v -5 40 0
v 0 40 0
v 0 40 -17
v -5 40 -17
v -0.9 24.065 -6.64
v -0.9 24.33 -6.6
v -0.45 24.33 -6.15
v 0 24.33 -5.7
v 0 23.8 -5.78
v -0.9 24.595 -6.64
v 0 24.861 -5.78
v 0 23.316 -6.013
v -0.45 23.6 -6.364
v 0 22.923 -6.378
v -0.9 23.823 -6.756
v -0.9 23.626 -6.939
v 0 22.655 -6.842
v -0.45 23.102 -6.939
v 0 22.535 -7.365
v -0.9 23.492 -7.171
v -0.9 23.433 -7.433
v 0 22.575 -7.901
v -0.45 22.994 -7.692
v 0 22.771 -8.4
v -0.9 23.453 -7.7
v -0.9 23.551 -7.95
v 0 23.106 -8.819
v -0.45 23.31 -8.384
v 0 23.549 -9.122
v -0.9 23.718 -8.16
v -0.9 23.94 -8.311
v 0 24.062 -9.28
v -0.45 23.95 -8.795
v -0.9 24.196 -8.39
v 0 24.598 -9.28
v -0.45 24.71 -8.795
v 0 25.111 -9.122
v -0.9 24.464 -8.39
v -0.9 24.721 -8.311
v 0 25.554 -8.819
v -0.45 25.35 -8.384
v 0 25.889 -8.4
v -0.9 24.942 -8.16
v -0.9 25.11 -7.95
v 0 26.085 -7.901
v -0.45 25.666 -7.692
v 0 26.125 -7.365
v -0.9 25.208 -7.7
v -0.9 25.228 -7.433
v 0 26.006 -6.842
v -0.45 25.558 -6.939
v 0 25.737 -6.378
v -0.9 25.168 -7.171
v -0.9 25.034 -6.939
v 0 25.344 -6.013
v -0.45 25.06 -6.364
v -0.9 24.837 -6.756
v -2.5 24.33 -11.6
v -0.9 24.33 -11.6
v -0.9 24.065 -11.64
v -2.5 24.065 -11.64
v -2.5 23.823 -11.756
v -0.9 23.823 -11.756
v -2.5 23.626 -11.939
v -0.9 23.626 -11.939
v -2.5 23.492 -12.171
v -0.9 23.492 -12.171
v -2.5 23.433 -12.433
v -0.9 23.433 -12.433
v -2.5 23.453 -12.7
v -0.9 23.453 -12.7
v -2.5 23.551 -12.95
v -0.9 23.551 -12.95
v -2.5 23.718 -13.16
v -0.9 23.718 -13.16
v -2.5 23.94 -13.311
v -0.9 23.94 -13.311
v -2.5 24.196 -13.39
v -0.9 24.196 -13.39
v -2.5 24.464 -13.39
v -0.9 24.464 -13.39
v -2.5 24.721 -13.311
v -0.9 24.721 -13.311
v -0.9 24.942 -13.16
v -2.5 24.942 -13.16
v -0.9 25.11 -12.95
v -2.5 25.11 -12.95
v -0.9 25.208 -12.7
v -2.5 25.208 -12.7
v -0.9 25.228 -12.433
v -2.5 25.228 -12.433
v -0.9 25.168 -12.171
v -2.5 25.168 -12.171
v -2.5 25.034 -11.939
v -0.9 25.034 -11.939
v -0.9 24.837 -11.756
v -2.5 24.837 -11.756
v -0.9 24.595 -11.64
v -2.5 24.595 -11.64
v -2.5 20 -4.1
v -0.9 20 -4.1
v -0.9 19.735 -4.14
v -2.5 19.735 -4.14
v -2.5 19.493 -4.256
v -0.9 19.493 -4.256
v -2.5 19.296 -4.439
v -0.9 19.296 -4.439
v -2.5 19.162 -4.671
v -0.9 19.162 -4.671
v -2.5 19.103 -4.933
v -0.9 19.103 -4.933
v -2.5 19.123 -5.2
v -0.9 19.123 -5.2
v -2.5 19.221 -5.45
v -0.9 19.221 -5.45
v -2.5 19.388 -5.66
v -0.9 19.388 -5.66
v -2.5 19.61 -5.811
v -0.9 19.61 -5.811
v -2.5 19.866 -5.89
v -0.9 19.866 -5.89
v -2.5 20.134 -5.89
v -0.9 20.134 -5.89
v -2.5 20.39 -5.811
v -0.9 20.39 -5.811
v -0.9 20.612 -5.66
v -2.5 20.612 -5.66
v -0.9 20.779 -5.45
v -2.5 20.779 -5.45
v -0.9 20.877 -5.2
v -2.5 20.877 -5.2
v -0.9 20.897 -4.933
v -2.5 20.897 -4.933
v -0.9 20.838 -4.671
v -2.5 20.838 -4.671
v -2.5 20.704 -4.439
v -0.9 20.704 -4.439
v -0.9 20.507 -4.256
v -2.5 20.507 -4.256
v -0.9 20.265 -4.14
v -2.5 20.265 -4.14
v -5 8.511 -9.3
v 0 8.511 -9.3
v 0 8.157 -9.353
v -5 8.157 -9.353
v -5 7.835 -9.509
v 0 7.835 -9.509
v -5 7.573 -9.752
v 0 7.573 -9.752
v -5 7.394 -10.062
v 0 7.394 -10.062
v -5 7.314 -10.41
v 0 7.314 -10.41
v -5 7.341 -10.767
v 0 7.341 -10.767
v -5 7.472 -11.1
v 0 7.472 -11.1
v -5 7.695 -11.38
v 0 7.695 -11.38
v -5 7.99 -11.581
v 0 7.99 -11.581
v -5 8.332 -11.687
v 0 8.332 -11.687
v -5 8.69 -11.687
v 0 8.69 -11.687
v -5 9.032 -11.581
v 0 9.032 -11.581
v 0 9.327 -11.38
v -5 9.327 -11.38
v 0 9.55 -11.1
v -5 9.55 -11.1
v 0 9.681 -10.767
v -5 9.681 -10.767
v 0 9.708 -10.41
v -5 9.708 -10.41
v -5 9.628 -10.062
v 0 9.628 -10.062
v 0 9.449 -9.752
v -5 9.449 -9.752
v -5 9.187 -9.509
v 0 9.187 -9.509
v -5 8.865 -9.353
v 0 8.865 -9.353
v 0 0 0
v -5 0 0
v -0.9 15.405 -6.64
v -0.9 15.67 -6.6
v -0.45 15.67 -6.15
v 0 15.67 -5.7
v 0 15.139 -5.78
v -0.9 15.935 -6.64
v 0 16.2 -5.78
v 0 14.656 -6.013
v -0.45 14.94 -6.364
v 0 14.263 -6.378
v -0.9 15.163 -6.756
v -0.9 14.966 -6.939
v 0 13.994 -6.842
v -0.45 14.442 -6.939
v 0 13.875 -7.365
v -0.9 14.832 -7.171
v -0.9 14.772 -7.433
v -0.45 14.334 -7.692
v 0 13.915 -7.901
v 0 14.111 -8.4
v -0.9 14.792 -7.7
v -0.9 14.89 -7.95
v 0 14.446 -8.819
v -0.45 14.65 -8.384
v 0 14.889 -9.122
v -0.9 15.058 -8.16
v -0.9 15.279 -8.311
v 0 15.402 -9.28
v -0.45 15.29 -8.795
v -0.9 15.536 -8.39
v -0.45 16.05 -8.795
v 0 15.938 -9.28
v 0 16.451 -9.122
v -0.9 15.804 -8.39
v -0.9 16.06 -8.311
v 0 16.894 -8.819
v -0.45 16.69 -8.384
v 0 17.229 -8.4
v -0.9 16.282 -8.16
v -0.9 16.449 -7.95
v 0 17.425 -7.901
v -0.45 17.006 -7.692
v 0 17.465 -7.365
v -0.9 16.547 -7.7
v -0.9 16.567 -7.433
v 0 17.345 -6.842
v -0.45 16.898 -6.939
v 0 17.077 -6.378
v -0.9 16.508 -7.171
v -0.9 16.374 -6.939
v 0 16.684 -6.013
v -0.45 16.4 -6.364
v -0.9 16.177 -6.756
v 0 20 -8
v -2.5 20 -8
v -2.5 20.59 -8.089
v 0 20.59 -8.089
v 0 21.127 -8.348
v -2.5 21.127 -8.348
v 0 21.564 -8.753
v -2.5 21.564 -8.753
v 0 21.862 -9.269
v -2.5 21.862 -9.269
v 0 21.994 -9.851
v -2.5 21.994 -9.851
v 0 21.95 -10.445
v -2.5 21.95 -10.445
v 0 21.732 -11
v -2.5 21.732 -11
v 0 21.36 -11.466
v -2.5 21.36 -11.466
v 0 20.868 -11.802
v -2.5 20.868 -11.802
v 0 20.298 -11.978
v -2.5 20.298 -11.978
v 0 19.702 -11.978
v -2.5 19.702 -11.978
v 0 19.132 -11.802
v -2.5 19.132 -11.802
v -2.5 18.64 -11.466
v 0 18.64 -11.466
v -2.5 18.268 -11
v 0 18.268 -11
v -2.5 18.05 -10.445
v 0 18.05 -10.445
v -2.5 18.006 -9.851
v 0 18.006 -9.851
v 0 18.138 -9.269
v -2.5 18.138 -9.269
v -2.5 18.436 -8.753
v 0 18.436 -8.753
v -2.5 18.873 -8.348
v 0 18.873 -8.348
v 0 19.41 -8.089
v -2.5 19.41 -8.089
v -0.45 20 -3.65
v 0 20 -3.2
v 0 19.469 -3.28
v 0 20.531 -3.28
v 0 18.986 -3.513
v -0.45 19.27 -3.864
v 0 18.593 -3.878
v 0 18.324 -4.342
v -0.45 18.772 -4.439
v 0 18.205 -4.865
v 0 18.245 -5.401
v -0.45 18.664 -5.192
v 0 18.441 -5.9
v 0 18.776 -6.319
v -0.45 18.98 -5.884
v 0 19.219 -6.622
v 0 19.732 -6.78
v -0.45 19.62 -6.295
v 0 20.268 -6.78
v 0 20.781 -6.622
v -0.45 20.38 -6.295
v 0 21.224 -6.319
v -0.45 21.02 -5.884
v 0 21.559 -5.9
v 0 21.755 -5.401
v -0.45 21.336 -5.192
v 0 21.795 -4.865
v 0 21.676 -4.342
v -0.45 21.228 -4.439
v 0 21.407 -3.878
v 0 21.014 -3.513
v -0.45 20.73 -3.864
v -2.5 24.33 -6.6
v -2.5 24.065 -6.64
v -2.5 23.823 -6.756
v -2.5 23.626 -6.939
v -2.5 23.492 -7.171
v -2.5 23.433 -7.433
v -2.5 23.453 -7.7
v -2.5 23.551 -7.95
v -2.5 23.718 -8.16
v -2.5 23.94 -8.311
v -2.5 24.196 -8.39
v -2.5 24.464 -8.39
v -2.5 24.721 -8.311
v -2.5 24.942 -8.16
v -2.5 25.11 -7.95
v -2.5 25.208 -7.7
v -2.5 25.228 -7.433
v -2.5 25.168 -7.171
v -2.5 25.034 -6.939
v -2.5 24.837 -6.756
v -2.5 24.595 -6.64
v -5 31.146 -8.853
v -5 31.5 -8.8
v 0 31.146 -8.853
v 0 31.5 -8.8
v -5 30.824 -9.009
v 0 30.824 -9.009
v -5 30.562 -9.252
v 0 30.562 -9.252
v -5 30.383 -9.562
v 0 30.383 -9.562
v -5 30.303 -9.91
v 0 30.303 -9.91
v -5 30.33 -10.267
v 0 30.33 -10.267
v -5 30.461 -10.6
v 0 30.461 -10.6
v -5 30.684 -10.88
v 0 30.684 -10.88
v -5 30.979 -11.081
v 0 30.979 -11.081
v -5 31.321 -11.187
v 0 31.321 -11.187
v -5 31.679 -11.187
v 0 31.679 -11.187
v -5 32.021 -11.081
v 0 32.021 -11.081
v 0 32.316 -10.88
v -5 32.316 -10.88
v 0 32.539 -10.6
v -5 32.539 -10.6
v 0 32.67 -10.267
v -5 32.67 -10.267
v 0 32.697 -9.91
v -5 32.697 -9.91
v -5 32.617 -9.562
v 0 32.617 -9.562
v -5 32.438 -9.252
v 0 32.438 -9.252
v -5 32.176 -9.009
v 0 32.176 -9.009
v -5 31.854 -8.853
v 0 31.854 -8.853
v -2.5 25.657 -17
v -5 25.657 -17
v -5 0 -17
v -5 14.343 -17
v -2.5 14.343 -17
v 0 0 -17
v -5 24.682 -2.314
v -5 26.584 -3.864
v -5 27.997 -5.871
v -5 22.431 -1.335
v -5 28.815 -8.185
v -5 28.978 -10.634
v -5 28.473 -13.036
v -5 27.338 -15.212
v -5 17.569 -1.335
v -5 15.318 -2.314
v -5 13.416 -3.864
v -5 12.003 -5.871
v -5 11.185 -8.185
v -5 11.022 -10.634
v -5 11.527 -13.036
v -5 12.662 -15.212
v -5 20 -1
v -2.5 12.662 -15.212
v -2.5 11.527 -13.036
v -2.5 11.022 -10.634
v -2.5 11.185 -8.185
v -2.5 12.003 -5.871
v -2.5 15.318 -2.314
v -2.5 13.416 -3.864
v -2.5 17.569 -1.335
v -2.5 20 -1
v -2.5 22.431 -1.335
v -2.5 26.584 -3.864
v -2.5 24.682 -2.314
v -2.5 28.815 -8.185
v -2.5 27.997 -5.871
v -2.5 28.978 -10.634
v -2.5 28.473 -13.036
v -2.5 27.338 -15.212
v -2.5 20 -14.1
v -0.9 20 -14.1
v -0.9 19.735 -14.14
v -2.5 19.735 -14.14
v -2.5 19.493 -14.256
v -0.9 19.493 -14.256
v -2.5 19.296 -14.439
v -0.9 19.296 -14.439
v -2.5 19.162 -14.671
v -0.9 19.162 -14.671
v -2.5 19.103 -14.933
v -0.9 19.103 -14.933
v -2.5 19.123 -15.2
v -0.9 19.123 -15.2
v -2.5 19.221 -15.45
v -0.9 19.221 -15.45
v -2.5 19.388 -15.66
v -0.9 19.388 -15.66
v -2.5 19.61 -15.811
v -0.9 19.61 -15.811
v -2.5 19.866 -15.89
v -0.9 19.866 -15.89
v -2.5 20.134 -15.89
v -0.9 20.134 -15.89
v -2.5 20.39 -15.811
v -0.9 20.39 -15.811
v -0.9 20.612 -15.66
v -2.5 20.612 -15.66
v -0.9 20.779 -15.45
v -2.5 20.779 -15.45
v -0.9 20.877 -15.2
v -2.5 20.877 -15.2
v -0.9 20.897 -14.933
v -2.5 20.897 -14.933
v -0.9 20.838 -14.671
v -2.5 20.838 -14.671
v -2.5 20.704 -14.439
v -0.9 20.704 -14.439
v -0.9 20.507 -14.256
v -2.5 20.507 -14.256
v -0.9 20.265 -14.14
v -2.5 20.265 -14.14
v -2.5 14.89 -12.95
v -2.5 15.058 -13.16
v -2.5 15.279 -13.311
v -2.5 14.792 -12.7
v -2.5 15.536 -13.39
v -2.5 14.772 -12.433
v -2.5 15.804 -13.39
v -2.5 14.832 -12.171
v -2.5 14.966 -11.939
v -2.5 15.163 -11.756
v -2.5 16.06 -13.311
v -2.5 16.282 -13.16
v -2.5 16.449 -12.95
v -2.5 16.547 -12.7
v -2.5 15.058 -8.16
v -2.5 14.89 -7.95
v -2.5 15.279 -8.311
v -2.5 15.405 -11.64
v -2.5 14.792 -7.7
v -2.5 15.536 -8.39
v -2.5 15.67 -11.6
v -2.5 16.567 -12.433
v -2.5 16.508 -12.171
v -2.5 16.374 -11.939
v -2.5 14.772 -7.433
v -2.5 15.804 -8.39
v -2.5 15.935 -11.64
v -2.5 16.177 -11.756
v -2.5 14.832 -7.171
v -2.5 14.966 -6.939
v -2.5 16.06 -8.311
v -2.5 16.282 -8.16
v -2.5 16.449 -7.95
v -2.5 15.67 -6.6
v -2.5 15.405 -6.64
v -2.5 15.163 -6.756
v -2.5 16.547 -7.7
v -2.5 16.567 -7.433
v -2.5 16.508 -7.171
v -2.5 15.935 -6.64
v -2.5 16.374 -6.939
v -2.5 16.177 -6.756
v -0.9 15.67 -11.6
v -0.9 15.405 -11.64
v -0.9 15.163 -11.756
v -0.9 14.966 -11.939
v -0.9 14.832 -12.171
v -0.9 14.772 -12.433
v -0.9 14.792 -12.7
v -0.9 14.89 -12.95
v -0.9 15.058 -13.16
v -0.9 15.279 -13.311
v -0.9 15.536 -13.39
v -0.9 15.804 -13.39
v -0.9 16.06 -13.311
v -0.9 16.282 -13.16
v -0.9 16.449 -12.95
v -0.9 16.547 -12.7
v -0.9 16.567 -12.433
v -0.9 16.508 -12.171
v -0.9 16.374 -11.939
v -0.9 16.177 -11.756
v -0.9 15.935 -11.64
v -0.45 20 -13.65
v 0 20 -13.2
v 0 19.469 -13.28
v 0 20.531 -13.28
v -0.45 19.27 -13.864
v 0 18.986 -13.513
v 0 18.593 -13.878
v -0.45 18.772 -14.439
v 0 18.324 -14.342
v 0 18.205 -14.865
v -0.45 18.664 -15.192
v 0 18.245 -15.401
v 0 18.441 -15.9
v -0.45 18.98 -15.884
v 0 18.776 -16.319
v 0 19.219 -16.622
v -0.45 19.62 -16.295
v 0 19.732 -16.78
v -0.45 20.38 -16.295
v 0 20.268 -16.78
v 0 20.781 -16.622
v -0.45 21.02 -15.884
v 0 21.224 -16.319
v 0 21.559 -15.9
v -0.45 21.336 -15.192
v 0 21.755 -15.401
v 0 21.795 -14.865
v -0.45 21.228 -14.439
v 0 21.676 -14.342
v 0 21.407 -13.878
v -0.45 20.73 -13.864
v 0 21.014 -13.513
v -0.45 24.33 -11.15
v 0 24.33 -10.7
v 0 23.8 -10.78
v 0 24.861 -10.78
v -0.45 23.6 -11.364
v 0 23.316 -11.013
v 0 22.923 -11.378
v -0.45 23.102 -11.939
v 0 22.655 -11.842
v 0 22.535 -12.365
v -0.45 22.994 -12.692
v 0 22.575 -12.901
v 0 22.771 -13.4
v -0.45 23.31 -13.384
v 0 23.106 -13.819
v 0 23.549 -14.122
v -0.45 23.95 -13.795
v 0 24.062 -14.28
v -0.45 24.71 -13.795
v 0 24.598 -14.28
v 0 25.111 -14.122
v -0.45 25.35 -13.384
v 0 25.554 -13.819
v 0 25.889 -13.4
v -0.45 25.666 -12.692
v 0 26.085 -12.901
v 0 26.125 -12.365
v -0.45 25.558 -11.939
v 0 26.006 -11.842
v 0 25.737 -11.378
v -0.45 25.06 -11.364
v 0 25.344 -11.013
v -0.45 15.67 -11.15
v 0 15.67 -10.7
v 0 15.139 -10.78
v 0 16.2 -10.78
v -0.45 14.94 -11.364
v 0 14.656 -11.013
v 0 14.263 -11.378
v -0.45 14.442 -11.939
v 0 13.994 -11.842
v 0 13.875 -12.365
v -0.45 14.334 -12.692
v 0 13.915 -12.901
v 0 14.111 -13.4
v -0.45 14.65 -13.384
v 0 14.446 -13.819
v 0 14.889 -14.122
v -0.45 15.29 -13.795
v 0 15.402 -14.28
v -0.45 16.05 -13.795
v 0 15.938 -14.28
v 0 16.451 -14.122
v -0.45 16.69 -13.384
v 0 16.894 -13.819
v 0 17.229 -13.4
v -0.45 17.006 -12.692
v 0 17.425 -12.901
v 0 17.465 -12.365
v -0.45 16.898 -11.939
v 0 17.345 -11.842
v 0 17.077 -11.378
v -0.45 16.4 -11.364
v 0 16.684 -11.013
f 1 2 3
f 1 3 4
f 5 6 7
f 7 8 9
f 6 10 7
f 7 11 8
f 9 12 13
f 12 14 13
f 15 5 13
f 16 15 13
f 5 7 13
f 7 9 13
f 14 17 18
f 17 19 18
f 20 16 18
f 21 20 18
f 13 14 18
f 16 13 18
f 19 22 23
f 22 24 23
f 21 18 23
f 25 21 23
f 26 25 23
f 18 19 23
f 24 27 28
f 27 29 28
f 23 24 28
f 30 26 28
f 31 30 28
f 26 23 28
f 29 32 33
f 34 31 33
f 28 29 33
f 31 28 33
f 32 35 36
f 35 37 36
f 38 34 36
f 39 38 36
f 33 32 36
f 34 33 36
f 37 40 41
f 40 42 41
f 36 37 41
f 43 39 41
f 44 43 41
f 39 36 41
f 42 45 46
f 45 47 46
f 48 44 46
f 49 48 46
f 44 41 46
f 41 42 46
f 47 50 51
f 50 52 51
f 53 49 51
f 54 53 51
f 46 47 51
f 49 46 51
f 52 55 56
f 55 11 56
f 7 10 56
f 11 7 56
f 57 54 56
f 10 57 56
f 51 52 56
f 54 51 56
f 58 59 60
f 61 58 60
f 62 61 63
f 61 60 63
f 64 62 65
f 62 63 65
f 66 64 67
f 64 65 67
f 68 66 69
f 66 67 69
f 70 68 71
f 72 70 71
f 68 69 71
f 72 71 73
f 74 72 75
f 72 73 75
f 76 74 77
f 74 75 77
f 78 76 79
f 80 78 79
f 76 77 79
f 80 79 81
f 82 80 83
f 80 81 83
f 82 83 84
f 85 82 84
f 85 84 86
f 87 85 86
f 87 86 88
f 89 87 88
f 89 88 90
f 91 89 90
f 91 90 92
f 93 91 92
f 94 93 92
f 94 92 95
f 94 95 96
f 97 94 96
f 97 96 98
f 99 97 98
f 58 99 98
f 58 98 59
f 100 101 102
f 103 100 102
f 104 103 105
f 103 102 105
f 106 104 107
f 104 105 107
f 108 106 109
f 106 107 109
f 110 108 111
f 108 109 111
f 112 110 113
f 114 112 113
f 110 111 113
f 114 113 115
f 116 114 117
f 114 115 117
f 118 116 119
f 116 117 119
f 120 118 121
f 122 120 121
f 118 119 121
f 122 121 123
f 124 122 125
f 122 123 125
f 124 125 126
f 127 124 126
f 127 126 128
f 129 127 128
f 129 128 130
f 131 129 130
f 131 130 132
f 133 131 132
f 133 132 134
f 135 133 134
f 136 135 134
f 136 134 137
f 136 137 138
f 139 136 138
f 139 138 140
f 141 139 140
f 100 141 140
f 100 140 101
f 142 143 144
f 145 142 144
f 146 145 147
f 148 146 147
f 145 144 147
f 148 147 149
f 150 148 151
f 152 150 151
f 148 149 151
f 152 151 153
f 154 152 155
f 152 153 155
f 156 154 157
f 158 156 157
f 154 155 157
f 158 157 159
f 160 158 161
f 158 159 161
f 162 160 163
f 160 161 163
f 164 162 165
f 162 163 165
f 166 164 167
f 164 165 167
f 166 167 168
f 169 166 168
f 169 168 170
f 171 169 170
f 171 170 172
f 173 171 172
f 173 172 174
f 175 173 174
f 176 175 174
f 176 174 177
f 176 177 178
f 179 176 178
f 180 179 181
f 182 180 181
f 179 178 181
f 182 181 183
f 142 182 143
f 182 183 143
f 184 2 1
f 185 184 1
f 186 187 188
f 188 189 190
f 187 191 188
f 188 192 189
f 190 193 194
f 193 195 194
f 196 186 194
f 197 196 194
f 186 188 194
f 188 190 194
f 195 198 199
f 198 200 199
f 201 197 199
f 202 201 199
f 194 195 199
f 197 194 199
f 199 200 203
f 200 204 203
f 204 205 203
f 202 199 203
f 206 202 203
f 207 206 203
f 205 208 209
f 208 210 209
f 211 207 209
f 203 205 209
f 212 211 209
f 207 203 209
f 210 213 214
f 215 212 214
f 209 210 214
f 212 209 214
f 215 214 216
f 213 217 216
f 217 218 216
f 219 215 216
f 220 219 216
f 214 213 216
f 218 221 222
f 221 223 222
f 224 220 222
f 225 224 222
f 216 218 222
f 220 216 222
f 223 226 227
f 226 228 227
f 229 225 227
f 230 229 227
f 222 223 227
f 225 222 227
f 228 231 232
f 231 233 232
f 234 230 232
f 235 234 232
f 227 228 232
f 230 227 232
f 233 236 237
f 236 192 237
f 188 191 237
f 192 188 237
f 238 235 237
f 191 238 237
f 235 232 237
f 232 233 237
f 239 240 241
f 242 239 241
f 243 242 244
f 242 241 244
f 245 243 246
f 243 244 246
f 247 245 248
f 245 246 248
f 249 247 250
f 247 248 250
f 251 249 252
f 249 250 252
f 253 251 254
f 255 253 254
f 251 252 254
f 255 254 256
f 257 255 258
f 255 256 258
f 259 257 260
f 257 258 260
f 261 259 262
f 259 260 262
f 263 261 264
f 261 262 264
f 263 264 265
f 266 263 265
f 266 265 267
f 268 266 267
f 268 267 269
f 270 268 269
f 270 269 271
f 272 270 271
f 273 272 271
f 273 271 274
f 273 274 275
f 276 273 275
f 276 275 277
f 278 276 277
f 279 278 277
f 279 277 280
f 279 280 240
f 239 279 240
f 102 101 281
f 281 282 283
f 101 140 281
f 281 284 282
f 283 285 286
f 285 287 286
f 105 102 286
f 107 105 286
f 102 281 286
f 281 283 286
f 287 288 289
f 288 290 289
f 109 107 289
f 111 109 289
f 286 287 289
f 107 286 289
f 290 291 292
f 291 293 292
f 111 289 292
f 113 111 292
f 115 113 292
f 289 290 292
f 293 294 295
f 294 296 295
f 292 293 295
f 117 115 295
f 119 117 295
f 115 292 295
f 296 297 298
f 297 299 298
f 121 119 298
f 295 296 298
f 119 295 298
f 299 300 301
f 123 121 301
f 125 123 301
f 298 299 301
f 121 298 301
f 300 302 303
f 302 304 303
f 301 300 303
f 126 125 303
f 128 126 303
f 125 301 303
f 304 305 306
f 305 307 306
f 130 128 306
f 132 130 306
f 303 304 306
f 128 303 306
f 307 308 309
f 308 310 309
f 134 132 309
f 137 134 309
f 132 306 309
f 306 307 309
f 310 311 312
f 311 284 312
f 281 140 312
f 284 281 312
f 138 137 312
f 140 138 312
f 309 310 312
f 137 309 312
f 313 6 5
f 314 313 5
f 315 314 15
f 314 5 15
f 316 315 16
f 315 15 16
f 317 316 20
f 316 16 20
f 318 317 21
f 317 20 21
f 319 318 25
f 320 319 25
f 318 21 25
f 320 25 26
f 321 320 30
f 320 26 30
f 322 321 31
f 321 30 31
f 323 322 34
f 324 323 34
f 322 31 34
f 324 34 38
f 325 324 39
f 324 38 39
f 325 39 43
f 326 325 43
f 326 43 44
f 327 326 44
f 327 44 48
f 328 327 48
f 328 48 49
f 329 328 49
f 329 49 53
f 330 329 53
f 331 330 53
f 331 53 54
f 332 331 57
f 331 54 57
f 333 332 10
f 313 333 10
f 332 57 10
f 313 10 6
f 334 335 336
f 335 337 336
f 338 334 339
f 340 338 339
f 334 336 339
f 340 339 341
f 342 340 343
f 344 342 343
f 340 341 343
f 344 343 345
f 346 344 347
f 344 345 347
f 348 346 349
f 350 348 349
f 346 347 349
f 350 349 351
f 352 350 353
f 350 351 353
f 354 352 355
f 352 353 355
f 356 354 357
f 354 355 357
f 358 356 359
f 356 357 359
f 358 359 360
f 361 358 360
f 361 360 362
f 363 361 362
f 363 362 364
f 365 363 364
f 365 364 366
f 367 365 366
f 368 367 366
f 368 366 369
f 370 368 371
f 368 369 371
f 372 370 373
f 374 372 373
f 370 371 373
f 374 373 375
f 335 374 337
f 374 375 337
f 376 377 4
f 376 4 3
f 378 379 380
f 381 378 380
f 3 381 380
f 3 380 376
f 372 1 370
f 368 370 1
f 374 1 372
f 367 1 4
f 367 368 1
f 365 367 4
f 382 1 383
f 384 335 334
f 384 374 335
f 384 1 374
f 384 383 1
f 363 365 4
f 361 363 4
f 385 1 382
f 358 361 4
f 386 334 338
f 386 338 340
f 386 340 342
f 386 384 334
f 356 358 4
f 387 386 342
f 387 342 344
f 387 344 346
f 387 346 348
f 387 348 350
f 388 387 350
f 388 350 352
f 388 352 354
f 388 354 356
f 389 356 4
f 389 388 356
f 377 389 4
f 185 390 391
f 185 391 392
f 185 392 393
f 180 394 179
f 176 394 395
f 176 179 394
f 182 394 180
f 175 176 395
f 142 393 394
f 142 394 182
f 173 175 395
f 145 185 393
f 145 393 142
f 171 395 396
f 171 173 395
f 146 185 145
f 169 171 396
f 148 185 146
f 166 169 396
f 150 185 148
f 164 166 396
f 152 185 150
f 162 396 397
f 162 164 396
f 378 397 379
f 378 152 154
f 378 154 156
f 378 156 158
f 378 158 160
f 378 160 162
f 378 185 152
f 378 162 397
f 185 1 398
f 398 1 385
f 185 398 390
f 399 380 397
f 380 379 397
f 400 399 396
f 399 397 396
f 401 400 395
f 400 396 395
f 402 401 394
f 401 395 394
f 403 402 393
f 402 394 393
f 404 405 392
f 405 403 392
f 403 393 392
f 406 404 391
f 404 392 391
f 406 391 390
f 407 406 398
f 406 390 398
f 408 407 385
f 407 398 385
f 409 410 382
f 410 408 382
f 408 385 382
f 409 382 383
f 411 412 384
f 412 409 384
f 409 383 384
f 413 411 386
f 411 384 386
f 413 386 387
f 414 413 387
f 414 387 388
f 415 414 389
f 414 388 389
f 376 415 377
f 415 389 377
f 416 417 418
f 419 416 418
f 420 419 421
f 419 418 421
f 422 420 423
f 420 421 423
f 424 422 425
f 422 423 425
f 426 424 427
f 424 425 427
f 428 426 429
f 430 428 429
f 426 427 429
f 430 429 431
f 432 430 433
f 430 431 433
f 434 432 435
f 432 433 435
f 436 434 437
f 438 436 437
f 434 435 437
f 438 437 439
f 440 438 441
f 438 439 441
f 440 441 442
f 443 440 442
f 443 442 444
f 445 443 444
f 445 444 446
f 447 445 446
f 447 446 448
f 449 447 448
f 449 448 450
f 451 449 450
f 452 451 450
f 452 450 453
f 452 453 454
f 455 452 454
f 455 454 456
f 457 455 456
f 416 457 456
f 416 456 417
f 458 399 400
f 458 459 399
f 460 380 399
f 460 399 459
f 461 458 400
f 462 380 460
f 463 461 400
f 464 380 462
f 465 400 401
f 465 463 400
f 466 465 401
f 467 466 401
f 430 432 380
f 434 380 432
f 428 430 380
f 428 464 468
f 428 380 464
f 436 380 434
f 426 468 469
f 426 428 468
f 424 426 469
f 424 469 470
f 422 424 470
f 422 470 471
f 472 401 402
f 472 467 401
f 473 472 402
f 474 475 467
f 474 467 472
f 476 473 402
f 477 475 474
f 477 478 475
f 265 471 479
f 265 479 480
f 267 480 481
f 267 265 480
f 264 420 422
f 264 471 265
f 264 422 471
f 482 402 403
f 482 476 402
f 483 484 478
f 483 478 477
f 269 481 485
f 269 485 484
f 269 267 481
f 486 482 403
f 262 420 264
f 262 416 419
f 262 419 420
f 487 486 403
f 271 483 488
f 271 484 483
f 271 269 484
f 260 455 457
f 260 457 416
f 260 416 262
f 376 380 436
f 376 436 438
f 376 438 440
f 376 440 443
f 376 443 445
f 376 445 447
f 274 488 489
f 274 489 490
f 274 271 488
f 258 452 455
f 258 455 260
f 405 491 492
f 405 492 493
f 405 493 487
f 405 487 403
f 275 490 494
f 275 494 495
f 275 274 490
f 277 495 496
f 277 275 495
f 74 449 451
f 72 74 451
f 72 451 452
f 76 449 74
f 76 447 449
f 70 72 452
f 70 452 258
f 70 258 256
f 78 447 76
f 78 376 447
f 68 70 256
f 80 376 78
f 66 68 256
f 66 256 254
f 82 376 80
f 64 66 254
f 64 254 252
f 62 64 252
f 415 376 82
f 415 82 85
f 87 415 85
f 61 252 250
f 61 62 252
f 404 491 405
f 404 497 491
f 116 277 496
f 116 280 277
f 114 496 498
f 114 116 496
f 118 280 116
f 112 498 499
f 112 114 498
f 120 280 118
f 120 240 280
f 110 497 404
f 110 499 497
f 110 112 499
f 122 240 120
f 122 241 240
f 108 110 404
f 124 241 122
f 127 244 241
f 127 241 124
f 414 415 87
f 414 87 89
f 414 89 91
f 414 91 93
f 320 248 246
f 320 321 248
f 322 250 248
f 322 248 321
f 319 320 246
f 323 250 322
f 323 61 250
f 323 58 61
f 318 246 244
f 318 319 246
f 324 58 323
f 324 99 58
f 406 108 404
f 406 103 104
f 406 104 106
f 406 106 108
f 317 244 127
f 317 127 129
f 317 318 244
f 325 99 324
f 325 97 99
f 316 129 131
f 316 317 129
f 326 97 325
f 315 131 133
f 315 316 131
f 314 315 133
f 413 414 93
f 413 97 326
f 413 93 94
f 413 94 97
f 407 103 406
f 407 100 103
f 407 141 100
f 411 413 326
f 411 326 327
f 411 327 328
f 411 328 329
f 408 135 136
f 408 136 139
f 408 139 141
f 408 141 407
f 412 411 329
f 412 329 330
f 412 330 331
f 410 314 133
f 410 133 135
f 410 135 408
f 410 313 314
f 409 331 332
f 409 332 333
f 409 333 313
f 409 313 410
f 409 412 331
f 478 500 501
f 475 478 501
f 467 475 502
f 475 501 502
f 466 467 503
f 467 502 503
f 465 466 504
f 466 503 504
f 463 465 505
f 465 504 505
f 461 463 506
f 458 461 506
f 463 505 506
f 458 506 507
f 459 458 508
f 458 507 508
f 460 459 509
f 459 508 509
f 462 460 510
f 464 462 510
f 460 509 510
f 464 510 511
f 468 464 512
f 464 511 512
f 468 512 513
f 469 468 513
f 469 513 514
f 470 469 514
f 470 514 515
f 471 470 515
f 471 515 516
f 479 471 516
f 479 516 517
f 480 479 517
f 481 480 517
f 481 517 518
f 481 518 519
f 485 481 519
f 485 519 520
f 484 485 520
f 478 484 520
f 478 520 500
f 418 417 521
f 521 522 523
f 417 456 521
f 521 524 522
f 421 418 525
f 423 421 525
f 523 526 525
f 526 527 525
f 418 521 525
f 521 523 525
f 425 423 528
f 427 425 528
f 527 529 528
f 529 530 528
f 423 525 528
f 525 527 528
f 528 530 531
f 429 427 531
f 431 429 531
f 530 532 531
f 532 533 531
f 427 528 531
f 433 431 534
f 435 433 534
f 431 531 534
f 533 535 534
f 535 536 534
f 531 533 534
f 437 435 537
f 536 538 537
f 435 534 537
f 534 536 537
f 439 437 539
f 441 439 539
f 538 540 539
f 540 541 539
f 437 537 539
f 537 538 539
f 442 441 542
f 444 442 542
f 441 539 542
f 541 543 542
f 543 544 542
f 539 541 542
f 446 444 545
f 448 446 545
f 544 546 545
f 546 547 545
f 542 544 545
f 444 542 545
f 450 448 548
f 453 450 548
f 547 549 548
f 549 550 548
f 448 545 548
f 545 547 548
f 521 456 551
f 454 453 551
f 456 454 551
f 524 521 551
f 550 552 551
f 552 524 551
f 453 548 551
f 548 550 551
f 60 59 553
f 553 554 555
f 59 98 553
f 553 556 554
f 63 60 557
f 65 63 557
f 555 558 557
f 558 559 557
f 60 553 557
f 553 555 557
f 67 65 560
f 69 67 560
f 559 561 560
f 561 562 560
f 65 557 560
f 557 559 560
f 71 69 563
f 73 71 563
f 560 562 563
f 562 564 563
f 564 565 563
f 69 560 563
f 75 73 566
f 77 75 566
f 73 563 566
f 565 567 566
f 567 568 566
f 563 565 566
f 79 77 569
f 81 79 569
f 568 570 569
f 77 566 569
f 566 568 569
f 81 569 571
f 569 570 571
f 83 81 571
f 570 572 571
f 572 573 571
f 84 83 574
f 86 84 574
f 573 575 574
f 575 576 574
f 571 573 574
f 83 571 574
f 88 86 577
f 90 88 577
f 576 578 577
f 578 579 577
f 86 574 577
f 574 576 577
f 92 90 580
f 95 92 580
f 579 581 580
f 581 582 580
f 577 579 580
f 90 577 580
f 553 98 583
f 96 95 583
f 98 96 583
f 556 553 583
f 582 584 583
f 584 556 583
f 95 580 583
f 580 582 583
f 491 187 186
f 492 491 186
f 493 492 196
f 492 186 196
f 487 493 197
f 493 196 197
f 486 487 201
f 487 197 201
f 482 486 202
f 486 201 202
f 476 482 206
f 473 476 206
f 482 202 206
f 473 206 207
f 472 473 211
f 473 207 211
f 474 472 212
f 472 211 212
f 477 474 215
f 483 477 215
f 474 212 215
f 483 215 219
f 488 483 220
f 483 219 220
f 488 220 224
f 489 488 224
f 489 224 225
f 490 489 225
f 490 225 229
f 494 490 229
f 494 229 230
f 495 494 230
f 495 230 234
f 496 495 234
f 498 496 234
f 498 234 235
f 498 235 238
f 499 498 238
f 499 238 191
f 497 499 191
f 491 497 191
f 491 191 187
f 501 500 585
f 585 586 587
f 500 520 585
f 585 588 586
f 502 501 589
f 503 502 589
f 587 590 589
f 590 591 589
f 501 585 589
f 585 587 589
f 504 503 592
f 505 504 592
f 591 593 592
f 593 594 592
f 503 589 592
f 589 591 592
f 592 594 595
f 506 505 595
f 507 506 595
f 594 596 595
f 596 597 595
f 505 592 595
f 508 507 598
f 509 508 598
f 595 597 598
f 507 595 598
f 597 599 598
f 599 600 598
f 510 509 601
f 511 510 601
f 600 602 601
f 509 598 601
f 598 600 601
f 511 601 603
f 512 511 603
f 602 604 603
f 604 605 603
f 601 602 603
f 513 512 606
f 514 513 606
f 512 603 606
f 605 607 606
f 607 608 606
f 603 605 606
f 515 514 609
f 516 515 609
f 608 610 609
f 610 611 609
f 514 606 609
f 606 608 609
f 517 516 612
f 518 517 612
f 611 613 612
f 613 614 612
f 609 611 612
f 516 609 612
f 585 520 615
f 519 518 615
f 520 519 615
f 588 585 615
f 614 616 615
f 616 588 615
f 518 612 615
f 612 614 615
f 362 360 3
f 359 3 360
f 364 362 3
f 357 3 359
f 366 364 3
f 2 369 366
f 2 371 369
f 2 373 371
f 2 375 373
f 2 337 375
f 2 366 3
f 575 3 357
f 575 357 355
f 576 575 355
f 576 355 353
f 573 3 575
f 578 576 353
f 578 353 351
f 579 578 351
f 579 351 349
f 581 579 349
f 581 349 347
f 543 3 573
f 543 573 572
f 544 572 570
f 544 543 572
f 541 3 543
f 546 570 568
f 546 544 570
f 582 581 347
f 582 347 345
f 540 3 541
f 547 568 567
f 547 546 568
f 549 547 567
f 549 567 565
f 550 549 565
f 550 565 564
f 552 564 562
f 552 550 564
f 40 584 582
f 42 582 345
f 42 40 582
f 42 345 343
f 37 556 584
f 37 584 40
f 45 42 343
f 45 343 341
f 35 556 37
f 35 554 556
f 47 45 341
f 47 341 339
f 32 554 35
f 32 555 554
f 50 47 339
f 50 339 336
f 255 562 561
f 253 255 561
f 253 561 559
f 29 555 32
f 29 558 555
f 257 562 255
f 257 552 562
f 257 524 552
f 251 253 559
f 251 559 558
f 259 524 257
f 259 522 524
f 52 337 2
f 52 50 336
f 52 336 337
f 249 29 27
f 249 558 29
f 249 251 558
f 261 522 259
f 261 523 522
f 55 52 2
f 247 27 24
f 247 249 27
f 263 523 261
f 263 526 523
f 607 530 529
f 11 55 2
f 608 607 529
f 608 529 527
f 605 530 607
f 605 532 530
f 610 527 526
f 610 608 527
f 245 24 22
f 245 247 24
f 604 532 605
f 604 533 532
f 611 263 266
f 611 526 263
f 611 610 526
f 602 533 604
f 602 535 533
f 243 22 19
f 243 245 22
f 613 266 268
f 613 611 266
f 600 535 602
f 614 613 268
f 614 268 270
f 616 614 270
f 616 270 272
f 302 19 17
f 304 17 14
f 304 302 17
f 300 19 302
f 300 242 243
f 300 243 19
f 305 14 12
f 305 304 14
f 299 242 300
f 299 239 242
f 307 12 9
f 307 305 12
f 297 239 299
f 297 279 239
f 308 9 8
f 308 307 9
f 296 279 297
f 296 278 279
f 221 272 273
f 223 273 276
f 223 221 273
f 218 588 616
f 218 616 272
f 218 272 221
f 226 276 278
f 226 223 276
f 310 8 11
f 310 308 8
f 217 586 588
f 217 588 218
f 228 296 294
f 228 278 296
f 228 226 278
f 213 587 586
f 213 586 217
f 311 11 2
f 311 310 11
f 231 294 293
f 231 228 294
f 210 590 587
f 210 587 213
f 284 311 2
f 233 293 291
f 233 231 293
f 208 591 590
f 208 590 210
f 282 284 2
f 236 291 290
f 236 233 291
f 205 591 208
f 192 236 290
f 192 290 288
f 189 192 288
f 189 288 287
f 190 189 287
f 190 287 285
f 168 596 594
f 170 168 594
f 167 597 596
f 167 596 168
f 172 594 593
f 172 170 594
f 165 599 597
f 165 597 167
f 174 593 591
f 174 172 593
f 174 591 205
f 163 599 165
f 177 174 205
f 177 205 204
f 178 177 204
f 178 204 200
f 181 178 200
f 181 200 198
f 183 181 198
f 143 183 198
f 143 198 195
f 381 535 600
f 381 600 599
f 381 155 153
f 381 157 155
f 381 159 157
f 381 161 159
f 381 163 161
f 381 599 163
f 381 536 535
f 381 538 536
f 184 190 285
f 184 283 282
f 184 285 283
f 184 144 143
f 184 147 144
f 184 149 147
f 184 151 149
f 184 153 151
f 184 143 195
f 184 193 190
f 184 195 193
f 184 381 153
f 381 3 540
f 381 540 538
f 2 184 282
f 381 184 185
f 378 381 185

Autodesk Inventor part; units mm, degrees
ref_plane "YZ Plane" through (0, 0, 0) normal (1, 0, 0) x (0, 1, 0)
ref_plane "XZ Plane" through (0, 0, 0) normal (0, 1, 0) x (-1, 0, 0)
sketch "Sketch1" plane through (0, 0, 0) normal (0, 1, 0) x (-1, 0, 0)
  line L0 (0, 0) -> (5, 0)
  line L1 (5, 0) -> (5, -17)
  line L2 (5, -17) -> (0, -17)
  line L3 (0, -17) -> (0, 0)
  dimension "d0" = 5
  dimension "d1" = 17
extrude "Extrusion1" add sketch "Sketch1" along normal blind 40
sketch "Sketch2" plane through (-5, 0, -17) normal (-1, 0, 0) x (0, 0, 1)
  line L0 (17, 0) -> (17, 40) projected
  line L1 (17, 20) -> (-0.1378, 20)
  circle A0 centre (7, 20) radius 2
  line L2 (0, 0) -> (17, 0) projected
  line L3 (6.5, -6.3182) -> (6.5, 42.5723) construction
  line L4 (0, 0) -> (0, 40) projected
  circle A1 centre (6.5, 8.5109) radius 0.5
  circle A2 centre (7, 31.5) radius 0.5
  dimension "d4" = 4
  dimension "d7" = 6.5
  dimension "d9" = 11.5
  dimension "d10" = 1
  dimension "d11" = 1
  dimension "d12" = 0.5
  dimension "d13" = 11.5
  dimension "d105" = 7
extrude "Extrusion2" cut sketch "Sketch2" against normal through all contours A0 L1 | L1 A0 | A1 | A2
hole "Hole1" at (-5, 8.5109, -10.5) direction (1, 0, 0) diameter 2.4 end through all clearance for "Flat Head Machine Screw" size "M2" standard "Ansi Metric M Profile"
hole "Hole2" at (-5, 31.5, -10) direction (1, 0, 0) diameter 2.4 end through all clearance for "Flat Head Machine Screw" size "M2" standard "Ansi Metric M Profile"
sketch "Sketch3" plane through (-5, 0, -17) normal (-1, 0, 0) x (0, 0, 1)
  circle A0 centre (7, 20) radius 2 projected
  circle A1 centre (7, 20) radius 5 construction
  line L0 (7, 20) -> (16.0941, 20)
  circle A2 centre (12, 20) radius 0.5
  circle A3 centre (9.5, 24.3301) radius 0.5
  circle A4 centre (4.5, 24.3301) radius 0.5
  circle A5 centre (2, 20) radius 0.5
  circle A6 centre (4.5, 15.6699) radius 0.5
  circle A7 centre (9.5, 15.6699) radius 0.5
  point P0 (17, 0)
  dimension "d32" = 10
  dimension "d33" = 1
  dimension "d36" = 360
extrude "Extrusion3" cut sketch "Sketch3" against normal through all contours A2 L0 | L0 A2 | A3 | A4 | A5 | A6 | A7
hole "Hole3" at (-5, 20, -5) direction (1, 0, 0) diameter 1.8 end through all countersink diameter 3.6 countersink angle 90 clearance for "Countersunk Flat Head Screw DIN EN ISO 2009" size "M1.6" standard "DIN"
hole "Hole4" at (-5, 15.6699, -7.5) direction (1, 0, 0) diameter 1.8 end through all countersink diameter 3.6 countersink angle 90 clearance for "Countersunk Flat Head Screw DIN EN ISO 2009" size "M1.6" standard "DIN"
hole "Hole5" at (-5, 15.6699, -12.5) direction (1, 0, 0) diameter 1.8 end through all countersink diameter 3.6 countersink angle 90 clearance for "Countersunk Flat Head Screw DIN EN ISO 2009" size "M1.6" standard "DIN"
hole "Hole6" at (-5, 20, -15) direction (1, 0, 0) diameter 1.8 end through all countersink diameter 3.6 countersink angle 90 clearance for "Countersunk Flat Head Screw DIN EN ISO 2009" size "M1.6" standard "DIN"
hole "Hole7" at (-5, 24.3301, -12.5) direction (1, 0, 0) diameter 1.8 end through all countersink diameter 3.6 countersink angle 90 clearance for "Countersunk Flat Head Screw DIN EN ISO 2009" size "M1.6" standard "DIN"
hole "Hole8" at (-5, 24.3301, -7.5) direction (1, 0, 0) diameter 1.8 end through all countersink diameter 3.6 countersink angle 90 clearance for "Countersunk Flat Head Screw DIN EN ISO 2009" size "M1.6" standard "DIN"
ref_plane "Work Plane1" through (-2.5, 0, -17) normal (-1, 0, 0) x (0, 0, 1)
mirror "Mirror1" about plane through (-2.5, 0, -17) normal (-1, 0, 0) of "Hole6", "Hole5", "Hole4", "Hole3", "Hole8", "Hole7"
sketch "Sketch6" plane through (-5, 0, -17) normal (-1, 0, 0) x (0, 0, 1)
  circle A0 centre (7, 20) radius 2 projected
  circle A1 centre (7, 20) radius 9
  point P0 (17, 0)
  dimension "d102" = 18
extrude "Extrusion6" cut sketch "Sketch6" against normal blind 2.5
properties part number "mounting"
